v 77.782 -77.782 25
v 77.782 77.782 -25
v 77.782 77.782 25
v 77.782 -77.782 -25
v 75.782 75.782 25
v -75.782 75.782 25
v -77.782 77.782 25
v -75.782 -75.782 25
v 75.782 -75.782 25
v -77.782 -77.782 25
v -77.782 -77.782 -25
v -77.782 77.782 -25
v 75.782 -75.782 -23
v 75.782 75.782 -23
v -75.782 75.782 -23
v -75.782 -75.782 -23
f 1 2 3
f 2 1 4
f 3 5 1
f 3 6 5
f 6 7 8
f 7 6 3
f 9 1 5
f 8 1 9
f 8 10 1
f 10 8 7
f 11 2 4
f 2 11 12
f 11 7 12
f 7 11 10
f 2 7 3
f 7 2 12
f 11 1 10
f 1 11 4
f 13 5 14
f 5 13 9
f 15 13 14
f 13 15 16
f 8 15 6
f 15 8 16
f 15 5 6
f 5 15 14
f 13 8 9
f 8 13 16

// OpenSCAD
radius_printer = 110; // leave a little slack
wall_thickness = 2;
cube_height = 50;

// calculate maximal sidelength of square that fits on round printer
max_side = sqrt(pow(2*radius_printer,2)/2);

difference(){
    color([1,1,1])
    cube([max_side, max_side, cube_height], center=true);
    translate([0,0,+wall_thickness])
    cube([max_side-2*wall_thickness, max_side-2*wall_thickness, cube_height], center=true);
}
